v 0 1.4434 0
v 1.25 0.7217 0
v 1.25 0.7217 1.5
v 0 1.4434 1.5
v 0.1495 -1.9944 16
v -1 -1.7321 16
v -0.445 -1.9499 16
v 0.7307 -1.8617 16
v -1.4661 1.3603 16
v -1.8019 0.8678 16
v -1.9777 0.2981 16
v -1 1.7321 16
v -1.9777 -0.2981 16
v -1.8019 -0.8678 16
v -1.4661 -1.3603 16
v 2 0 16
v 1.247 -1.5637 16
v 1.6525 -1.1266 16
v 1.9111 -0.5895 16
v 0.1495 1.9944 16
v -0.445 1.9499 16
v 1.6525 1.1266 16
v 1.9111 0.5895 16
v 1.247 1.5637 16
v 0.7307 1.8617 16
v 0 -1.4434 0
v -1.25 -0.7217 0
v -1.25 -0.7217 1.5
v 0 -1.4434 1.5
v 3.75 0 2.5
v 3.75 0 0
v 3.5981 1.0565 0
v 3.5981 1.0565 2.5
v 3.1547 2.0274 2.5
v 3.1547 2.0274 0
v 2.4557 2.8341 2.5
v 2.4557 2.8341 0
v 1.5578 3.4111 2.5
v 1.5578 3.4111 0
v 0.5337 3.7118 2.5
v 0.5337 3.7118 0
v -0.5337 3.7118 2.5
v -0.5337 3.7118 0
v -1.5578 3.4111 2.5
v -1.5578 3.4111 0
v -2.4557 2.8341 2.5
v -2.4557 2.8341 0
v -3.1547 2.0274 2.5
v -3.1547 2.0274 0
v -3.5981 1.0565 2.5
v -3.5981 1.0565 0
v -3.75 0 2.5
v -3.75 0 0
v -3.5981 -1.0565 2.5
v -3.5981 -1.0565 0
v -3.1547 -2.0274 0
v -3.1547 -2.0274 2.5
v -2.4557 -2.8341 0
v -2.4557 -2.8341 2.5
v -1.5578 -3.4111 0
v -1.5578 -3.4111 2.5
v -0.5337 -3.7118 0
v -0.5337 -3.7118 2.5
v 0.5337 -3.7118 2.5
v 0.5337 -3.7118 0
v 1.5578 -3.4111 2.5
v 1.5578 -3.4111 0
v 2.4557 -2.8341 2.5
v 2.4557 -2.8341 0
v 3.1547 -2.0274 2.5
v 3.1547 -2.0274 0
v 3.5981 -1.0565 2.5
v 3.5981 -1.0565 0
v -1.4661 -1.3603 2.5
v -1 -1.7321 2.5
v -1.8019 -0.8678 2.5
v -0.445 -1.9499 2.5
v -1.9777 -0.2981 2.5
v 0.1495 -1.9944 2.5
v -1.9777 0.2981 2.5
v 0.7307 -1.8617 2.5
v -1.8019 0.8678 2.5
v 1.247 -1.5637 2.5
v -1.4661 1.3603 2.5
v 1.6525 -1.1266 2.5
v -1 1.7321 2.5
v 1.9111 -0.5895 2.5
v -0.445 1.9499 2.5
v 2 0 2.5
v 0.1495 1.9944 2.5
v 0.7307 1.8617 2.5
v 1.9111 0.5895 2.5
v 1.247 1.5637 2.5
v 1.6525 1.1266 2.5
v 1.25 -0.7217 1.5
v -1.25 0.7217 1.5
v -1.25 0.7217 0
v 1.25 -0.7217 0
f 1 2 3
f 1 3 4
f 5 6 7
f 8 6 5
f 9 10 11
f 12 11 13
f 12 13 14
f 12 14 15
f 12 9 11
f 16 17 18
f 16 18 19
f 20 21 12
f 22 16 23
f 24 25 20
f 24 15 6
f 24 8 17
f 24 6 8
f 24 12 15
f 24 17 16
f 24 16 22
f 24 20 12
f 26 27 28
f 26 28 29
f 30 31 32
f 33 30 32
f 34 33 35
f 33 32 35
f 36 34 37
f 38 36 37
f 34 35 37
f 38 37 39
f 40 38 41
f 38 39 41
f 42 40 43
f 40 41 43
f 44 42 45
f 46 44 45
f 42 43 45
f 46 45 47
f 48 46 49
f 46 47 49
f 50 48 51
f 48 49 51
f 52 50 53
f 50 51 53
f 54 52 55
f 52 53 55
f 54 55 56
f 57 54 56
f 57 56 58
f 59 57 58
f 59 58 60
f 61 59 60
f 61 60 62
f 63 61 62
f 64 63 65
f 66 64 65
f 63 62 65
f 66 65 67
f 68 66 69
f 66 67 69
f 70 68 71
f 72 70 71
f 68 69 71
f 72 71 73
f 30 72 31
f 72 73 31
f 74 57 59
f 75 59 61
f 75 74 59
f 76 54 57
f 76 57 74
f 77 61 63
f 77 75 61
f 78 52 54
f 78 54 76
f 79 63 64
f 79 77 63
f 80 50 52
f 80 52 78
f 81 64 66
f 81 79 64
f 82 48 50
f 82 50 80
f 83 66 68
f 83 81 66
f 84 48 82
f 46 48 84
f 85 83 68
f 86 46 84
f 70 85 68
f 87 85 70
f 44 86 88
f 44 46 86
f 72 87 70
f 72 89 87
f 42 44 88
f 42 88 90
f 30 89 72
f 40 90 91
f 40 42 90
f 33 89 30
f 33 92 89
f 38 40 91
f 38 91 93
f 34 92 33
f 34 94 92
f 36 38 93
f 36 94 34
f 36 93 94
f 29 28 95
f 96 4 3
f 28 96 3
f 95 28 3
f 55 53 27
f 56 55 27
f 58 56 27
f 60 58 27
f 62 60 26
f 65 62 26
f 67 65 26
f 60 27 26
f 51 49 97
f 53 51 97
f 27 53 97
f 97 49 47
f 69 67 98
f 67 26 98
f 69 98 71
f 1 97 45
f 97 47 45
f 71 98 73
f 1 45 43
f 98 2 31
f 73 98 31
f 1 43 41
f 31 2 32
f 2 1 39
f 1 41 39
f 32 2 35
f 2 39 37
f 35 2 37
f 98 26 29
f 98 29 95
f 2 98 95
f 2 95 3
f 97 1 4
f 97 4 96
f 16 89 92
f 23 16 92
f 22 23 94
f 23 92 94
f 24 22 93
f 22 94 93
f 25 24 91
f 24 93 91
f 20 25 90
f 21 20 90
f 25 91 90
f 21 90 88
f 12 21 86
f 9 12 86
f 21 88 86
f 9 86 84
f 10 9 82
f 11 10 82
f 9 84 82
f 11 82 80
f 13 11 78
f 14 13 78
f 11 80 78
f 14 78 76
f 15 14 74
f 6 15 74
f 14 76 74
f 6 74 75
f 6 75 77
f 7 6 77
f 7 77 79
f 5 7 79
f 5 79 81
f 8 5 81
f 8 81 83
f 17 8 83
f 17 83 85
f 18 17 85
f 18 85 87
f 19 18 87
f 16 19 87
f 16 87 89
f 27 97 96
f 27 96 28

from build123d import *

# Parameters (mm, degrees)
SK_CABEZA_AVELLANADA_R  = 3.75
CABEZA_AVELLANADA_DEPTH = 2.5
SK_CUERPO_R             = 2
CUERPO_DEPTH            = 16
HEXAGONO_INTERIOR_DEPTH = 1.5


with BuildPart() as part:
    # Sk_Cabeza_avellanada → Cabeza_avellanada (new body)
    with BuildSketch(Plane.XY):
        Circle(SK_CABEZA_AVELLANADA_R)
    extrude(amount=CABEZA_AVELLANADA_DEPTH)

    # Sk_Cuerpo → Cuerpo (add)
    with BuildSketch(Plane.XY):
        Circle(SK_CUERPO_R)
    extrude(amount=CUERPO_DEPTH)

    # Sk_Hexagono_interior → Hexagono_interior (cut)
    with BuildSketch(Plane.XY):
        Polygon((0, -1.443375673), (1.25, -0.721687836), (1.25, 0.721687836), (0, 1.443375673), (-1.25, 0.721687836), (-1.25, -0.721687836), align=None)
    extrude(amount=HEXAGONO_INTERIOR_DEPTH, mode=Mode.SUBTRACT)


solid = part.part
